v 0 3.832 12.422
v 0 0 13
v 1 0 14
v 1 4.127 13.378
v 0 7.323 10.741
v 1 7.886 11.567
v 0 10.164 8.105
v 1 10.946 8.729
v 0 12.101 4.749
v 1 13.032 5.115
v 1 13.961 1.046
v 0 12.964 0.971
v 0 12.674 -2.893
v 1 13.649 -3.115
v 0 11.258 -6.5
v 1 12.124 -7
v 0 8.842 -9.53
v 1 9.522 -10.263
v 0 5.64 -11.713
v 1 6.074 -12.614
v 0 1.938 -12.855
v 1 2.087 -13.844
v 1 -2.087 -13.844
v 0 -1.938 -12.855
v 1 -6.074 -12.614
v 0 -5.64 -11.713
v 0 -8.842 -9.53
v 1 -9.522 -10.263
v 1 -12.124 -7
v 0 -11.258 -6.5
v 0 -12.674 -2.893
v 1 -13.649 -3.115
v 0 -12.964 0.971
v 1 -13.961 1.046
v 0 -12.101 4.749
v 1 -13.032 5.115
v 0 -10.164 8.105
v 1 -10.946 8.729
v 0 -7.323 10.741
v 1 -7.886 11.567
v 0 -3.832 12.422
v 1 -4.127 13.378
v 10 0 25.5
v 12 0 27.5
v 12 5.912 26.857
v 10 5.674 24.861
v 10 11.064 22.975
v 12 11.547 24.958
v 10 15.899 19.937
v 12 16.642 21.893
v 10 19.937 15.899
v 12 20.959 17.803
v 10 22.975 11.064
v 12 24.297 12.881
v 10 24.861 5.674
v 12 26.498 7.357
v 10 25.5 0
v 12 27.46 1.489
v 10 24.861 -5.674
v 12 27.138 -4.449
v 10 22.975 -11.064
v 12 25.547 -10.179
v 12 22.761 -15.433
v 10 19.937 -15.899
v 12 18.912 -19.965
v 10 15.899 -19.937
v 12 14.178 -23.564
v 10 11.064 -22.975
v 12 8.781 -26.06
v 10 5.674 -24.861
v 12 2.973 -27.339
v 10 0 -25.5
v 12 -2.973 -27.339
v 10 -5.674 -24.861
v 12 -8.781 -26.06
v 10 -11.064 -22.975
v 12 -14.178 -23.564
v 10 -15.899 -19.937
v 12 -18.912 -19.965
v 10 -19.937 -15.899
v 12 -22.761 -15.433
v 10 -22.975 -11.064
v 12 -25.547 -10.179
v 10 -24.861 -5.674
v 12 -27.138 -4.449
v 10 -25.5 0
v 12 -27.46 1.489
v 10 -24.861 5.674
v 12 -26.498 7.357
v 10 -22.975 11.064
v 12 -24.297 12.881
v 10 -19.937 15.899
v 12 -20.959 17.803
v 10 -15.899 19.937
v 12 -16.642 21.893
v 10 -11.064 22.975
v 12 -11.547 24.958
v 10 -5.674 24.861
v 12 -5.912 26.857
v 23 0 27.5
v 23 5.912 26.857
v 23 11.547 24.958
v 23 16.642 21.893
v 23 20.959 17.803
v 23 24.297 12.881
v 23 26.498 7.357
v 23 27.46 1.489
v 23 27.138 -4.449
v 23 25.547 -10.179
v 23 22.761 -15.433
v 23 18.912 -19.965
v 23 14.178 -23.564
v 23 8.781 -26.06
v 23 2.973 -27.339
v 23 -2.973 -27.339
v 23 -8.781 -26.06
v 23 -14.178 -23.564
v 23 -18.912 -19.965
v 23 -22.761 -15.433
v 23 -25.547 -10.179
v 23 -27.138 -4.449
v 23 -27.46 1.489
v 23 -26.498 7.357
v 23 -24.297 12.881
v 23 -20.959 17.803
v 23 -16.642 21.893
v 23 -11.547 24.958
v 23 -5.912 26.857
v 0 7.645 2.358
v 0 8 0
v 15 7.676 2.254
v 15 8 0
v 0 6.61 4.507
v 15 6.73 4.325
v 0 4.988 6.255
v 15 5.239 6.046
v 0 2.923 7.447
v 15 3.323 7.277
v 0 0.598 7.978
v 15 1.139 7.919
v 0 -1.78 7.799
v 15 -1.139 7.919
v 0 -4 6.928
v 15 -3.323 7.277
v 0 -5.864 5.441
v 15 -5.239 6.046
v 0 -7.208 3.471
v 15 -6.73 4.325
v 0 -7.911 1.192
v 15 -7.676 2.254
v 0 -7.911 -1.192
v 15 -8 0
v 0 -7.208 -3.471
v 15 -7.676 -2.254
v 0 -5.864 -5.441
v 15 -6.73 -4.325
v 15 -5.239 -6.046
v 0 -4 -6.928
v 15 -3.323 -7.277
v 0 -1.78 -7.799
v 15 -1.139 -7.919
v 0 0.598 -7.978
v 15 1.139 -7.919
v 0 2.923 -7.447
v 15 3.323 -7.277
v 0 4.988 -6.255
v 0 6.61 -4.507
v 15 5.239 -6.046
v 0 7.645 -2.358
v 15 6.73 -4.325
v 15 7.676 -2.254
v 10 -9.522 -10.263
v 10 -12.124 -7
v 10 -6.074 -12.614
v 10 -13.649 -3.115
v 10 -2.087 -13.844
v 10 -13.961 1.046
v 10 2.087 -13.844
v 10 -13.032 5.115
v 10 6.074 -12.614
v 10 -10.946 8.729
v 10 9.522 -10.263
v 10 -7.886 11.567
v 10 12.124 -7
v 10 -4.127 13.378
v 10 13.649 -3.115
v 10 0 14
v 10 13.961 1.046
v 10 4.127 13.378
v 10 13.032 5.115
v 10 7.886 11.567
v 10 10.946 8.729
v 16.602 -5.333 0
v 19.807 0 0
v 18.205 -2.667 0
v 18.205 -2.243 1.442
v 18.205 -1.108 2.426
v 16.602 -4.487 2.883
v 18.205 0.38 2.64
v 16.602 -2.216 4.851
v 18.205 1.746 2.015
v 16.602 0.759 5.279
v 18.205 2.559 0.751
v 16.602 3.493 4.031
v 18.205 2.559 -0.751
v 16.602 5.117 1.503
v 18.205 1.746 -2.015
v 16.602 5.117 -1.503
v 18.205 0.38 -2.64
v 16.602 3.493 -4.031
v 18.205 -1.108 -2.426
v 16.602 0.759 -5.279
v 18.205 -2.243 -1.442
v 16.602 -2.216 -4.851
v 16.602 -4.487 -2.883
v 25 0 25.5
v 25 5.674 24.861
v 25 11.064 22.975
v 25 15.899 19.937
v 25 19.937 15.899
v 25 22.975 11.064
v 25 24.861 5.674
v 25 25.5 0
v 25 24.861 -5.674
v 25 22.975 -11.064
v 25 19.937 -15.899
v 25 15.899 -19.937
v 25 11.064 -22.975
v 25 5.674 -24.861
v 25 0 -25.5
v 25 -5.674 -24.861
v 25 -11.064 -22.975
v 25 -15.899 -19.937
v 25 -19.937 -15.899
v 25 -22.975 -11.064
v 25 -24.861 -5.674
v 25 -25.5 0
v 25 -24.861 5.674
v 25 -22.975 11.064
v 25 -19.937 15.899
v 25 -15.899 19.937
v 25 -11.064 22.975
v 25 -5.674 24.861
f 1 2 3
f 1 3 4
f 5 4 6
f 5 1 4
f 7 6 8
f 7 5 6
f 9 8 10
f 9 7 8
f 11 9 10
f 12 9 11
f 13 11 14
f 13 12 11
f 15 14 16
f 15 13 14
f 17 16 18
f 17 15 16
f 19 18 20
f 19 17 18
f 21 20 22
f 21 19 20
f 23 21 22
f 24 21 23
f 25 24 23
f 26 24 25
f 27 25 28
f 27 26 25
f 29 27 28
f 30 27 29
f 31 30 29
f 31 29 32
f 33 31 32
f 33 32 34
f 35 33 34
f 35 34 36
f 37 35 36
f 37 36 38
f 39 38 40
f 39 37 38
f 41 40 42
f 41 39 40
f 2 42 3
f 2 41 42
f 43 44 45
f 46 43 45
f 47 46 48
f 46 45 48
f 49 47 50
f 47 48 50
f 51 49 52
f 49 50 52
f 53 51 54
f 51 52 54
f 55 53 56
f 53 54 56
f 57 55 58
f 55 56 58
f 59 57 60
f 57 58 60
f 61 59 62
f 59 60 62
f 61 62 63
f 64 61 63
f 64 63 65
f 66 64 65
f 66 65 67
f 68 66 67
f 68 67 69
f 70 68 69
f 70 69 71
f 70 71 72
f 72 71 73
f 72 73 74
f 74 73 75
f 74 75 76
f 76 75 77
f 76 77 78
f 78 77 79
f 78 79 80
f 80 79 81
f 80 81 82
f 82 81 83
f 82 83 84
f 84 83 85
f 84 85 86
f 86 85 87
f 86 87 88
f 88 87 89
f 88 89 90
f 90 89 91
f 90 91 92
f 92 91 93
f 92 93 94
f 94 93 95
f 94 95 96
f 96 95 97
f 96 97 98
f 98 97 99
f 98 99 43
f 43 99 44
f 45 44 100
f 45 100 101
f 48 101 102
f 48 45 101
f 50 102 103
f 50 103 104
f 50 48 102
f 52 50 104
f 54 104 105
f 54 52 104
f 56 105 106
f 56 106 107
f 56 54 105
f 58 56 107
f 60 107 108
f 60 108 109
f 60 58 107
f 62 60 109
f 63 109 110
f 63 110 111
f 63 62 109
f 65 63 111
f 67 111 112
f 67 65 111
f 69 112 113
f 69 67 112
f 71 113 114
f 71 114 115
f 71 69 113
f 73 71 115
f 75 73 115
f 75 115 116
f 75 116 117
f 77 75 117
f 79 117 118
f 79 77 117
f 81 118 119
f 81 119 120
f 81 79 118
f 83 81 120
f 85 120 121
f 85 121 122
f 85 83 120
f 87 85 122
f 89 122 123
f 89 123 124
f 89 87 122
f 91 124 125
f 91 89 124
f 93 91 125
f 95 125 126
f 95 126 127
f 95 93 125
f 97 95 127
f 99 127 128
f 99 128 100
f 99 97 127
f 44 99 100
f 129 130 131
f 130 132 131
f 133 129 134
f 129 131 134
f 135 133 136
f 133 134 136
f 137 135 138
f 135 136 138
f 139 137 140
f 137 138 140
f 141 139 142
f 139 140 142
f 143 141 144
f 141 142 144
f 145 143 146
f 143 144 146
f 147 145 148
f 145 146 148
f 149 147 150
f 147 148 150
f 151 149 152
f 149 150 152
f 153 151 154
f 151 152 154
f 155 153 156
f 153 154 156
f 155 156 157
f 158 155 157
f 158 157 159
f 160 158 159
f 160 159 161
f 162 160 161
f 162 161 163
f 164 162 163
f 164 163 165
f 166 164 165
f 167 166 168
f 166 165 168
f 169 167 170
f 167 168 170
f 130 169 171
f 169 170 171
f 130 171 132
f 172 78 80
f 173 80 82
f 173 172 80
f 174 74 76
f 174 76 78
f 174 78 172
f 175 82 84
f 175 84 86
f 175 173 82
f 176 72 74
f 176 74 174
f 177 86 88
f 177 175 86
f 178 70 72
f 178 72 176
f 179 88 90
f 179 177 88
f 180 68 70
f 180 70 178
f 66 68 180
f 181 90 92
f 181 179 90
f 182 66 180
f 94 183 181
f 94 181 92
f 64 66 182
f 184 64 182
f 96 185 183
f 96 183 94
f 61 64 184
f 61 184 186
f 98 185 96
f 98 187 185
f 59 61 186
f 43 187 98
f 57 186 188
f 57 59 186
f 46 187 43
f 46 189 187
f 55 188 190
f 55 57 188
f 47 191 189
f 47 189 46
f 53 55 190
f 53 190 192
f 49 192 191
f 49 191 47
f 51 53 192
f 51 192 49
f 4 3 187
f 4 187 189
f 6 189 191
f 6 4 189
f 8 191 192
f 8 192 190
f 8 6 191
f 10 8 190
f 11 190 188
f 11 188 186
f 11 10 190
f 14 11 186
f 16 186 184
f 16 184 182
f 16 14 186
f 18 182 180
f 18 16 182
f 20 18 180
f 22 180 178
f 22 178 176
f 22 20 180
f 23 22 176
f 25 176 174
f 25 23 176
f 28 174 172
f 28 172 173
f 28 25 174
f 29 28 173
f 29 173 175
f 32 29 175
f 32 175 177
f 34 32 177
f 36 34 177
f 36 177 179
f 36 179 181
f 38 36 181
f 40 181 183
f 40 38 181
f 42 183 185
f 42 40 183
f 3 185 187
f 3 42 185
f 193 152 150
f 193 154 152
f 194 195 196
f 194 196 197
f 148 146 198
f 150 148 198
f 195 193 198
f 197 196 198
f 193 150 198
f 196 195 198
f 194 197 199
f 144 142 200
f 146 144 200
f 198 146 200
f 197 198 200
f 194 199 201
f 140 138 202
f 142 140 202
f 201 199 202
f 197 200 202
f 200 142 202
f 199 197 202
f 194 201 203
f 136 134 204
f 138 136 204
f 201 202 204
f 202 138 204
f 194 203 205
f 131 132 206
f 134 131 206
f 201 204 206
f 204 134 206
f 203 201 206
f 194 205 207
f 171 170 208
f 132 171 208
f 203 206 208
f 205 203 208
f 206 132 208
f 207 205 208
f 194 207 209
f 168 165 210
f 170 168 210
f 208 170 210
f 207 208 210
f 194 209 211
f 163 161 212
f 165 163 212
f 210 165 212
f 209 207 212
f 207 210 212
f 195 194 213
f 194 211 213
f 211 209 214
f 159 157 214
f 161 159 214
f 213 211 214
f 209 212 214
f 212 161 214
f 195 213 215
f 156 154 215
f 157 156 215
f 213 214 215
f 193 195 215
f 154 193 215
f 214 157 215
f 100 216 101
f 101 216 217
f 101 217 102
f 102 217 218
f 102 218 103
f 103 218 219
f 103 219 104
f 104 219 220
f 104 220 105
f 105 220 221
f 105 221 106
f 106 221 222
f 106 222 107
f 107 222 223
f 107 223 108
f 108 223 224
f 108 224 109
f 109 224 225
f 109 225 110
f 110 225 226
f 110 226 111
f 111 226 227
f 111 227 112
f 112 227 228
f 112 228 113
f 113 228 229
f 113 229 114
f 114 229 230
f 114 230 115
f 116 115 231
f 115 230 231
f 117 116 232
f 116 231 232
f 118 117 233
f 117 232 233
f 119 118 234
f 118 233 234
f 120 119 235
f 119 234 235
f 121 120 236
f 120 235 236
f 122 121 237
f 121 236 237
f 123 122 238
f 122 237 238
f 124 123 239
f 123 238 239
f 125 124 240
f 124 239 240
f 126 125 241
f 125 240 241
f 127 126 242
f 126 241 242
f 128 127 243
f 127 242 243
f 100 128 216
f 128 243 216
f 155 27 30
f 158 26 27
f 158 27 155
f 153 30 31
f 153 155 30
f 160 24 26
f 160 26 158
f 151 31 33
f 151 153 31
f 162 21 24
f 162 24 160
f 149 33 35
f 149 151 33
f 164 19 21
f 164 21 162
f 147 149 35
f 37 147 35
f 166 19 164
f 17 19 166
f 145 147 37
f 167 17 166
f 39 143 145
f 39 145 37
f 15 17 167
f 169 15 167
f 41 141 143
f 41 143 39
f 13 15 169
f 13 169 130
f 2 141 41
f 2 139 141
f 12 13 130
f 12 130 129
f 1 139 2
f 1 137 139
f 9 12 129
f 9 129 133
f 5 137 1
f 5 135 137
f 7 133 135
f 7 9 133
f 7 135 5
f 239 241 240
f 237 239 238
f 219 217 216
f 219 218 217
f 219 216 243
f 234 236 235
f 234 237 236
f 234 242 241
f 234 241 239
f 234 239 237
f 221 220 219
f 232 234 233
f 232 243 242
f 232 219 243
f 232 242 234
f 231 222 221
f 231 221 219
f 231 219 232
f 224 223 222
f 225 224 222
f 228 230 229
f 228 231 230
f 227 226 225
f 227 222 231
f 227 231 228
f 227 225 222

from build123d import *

# Parameters (mm, degrees)
F3_D     = 16
F3_DEPTH = 15
F3_TIP   = 4.8068849522
F4_SIZE  = 2
F5_SIZE  = 1


with BuildPart() as f1:
    # F0 (on Front) → F1 (revolve)
    with BuildSketch(Plane.XZ):
        Polygon((0, 14), (0, 0), (25, 0), (25, 27.5), (10, 27.5), (10, 14), align=None)
    revolve(axis=Axis((12.5, 0, 0), (-1, 0, 0)))

    # F3
    with Locations(Plane(origin=(0, 0, 0), x_dir=(0, -1, 0), z_dir=(-1, 0, 0))):
        with Locations((0, 0)):
            Hole(F3_D / 2, depth=F3_DEPTH)
            with Locations((0, 0, -(F3_DEPTH + F3_TIP / 2))):  # 118° drill point
                Cone(0, F3_D / 2, F3_TIP, mode=Mode.SUBTRACT)

    # F4
    f4_edges = [f1.edges().sort_by_distance(p)[0] for p in [
        (25, 0, -27.5),
        (10, 0, -27.5),
        (17.5, 0, 27.5),
    ]]
    chamfer(f4_edges, length=F4_SIZE)

    # F5
    f5_edges = [f1.edges().sort_by_distance(p)[0] for p in [
        (0, 0, -14),
    ]]
    chamfer(f5_edges, length=F5_SIZE)


solid = f1.part
